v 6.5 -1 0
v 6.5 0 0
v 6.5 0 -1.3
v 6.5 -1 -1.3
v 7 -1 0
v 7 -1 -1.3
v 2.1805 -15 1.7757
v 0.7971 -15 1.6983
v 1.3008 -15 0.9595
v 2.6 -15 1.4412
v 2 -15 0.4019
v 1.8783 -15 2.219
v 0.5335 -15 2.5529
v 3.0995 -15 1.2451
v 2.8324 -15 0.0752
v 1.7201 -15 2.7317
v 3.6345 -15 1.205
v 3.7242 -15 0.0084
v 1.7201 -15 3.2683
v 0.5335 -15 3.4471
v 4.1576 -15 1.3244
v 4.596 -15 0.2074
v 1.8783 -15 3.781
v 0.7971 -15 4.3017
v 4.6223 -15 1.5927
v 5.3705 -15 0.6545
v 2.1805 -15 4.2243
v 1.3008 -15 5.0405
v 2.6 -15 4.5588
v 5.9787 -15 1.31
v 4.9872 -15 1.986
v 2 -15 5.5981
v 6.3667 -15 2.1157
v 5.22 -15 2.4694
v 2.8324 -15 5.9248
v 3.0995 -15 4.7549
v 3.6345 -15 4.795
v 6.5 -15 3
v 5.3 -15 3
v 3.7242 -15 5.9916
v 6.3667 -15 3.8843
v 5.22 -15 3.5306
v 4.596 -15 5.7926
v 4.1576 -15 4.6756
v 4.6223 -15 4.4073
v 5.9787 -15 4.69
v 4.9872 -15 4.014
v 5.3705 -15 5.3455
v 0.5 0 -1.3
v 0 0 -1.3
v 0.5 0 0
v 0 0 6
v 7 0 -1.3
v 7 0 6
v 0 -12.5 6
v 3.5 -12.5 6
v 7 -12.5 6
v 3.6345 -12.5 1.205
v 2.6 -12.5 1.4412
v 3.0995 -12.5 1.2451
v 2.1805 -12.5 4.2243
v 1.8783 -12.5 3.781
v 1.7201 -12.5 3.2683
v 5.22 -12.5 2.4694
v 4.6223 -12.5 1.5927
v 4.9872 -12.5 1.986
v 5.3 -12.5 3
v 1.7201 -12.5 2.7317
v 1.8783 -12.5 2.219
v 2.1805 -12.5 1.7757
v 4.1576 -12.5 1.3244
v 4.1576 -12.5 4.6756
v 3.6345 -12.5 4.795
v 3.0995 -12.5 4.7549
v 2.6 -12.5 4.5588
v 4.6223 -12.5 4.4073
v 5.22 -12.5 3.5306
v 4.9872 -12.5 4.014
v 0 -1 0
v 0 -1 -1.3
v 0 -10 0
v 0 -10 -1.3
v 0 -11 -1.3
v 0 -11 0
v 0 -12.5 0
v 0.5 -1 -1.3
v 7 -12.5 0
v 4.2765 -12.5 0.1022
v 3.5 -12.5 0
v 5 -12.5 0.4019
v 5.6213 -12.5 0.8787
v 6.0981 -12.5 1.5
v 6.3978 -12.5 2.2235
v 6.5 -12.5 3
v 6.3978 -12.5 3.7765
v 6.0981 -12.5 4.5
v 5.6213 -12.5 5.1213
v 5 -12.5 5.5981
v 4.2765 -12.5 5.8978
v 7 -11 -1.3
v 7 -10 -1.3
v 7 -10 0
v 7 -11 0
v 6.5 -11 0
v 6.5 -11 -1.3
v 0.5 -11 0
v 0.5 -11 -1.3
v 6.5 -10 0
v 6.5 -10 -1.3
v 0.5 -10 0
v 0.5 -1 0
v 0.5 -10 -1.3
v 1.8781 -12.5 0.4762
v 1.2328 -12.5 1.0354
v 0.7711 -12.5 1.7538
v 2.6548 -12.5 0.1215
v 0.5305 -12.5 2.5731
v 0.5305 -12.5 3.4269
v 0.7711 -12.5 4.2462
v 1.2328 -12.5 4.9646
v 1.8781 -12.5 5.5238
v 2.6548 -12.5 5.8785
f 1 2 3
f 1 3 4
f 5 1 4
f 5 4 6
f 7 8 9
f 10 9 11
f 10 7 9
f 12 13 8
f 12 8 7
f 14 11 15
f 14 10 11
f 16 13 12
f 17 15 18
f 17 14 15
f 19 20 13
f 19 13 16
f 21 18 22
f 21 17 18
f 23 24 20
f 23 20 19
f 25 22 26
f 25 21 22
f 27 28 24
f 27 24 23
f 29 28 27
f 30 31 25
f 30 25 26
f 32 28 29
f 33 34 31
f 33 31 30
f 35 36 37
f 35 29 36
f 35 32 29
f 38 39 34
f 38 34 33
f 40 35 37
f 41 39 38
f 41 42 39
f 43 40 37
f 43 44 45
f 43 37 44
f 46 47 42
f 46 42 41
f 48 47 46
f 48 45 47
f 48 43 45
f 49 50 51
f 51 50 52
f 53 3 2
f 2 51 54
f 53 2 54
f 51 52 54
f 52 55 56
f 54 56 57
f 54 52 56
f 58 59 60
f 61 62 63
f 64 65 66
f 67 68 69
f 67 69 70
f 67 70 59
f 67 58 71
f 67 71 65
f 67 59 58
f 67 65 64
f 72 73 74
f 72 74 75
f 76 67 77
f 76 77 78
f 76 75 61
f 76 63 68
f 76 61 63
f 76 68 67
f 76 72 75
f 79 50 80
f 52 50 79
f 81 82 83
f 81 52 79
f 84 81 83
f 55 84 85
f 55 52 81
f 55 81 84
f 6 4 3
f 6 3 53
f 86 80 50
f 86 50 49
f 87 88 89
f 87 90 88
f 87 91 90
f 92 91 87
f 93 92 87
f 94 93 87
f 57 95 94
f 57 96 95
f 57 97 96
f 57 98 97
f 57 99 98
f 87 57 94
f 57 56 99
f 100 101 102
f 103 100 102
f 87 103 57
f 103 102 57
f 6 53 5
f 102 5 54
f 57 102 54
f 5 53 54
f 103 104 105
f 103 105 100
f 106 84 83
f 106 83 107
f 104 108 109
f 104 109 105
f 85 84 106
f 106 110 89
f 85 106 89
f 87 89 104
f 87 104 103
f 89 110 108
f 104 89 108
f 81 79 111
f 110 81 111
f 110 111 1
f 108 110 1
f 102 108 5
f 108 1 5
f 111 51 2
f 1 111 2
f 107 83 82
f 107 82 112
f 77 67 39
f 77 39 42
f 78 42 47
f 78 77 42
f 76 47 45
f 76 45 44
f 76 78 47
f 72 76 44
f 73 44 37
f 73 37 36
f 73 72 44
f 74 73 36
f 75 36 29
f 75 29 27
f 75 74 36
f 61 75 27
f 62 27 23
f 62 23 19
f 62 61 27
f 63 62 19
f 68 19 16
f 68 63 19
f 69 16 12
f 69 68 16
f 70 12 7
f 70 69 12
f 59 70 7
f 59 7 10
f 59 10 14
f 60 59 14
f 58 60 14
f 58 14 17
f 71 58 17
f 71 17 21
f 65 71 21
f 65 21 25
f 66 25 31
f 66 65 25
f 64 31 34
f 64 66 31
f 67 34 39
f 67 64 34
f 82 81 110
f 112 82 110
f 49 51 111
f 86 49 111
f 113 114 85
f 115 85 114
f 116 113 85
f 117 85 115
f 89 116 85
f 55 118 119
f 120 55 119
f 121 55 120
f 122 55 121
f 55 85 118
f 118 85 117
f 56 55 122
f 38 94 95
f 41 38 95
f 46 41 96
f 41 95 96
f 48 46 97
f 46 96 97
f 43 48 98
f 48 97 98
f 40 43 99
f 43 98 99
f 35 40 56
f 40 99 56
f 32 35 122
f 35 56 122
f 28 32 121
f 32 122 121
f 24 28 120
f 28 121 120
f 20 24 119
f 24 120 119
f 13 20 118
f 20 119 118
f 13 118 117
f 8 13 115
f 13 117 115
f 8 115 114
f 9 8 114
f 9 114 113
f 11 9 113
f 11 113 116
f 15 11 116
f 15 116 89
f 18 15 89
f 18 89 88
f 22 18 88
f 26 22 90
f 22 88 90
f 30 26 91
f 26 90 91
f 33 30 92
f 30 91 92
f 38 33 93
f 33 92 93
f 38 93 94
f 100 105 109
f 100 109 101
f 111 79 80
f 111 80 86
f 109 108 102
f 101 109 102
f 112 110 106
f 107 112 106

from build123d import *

# Parameters (mm, degrees)
F0_W     = 7
F0_H     = 6
F1_DEPTH = 12.5
F2_R     = 3
F2_R_2   = 1.8
F3_DEPTH = 2.5
F4_W     = 0.5
F4_H     = 1
F5_DEPTH = 1.3


with BuildPart() as f1:
    # F0 (on Front) → F1 (new body)
    with BuildSketch(Plane.XZ):
        with Locations((3.5, 3)):
            Rectangle(F0_W, F0_H)
    extrude(amount=F1_DEPTH)

    # F2 (on face) → F3 (join)
    with BuildSketch(Plane.XZ.offset(12.5)):
        with Locations((3.5, 3)):
            Circle(F2_R)
        with Locations((3.5, 3)):
            Circle(F2_R_2, mode=Mode.SUBTRACT)
    extrude(amount=F3_DEPTH)

    # F4 (on face) → F5 (join)
    with BuildSketch(Plane(origin=(0, 0, 0), x_dir=(1, 0, 0), z_dir=(0, 0, -1))):
        with Locations((0.25, 0.5)):
            Rectangle(F4_W, F4_H)
        with Locations((0.25, 10.5)):
            Rectangle(F4_W, F4_H)
        with Locations((6.75, 10.5)):
            Rectangle(F4_W, F4_H)
        with Locations((6.75, 0.5)):
            Rectangle(F4_W, F4_H)
    extrude(amount=F5_DEPTH)


solid = f1.part
